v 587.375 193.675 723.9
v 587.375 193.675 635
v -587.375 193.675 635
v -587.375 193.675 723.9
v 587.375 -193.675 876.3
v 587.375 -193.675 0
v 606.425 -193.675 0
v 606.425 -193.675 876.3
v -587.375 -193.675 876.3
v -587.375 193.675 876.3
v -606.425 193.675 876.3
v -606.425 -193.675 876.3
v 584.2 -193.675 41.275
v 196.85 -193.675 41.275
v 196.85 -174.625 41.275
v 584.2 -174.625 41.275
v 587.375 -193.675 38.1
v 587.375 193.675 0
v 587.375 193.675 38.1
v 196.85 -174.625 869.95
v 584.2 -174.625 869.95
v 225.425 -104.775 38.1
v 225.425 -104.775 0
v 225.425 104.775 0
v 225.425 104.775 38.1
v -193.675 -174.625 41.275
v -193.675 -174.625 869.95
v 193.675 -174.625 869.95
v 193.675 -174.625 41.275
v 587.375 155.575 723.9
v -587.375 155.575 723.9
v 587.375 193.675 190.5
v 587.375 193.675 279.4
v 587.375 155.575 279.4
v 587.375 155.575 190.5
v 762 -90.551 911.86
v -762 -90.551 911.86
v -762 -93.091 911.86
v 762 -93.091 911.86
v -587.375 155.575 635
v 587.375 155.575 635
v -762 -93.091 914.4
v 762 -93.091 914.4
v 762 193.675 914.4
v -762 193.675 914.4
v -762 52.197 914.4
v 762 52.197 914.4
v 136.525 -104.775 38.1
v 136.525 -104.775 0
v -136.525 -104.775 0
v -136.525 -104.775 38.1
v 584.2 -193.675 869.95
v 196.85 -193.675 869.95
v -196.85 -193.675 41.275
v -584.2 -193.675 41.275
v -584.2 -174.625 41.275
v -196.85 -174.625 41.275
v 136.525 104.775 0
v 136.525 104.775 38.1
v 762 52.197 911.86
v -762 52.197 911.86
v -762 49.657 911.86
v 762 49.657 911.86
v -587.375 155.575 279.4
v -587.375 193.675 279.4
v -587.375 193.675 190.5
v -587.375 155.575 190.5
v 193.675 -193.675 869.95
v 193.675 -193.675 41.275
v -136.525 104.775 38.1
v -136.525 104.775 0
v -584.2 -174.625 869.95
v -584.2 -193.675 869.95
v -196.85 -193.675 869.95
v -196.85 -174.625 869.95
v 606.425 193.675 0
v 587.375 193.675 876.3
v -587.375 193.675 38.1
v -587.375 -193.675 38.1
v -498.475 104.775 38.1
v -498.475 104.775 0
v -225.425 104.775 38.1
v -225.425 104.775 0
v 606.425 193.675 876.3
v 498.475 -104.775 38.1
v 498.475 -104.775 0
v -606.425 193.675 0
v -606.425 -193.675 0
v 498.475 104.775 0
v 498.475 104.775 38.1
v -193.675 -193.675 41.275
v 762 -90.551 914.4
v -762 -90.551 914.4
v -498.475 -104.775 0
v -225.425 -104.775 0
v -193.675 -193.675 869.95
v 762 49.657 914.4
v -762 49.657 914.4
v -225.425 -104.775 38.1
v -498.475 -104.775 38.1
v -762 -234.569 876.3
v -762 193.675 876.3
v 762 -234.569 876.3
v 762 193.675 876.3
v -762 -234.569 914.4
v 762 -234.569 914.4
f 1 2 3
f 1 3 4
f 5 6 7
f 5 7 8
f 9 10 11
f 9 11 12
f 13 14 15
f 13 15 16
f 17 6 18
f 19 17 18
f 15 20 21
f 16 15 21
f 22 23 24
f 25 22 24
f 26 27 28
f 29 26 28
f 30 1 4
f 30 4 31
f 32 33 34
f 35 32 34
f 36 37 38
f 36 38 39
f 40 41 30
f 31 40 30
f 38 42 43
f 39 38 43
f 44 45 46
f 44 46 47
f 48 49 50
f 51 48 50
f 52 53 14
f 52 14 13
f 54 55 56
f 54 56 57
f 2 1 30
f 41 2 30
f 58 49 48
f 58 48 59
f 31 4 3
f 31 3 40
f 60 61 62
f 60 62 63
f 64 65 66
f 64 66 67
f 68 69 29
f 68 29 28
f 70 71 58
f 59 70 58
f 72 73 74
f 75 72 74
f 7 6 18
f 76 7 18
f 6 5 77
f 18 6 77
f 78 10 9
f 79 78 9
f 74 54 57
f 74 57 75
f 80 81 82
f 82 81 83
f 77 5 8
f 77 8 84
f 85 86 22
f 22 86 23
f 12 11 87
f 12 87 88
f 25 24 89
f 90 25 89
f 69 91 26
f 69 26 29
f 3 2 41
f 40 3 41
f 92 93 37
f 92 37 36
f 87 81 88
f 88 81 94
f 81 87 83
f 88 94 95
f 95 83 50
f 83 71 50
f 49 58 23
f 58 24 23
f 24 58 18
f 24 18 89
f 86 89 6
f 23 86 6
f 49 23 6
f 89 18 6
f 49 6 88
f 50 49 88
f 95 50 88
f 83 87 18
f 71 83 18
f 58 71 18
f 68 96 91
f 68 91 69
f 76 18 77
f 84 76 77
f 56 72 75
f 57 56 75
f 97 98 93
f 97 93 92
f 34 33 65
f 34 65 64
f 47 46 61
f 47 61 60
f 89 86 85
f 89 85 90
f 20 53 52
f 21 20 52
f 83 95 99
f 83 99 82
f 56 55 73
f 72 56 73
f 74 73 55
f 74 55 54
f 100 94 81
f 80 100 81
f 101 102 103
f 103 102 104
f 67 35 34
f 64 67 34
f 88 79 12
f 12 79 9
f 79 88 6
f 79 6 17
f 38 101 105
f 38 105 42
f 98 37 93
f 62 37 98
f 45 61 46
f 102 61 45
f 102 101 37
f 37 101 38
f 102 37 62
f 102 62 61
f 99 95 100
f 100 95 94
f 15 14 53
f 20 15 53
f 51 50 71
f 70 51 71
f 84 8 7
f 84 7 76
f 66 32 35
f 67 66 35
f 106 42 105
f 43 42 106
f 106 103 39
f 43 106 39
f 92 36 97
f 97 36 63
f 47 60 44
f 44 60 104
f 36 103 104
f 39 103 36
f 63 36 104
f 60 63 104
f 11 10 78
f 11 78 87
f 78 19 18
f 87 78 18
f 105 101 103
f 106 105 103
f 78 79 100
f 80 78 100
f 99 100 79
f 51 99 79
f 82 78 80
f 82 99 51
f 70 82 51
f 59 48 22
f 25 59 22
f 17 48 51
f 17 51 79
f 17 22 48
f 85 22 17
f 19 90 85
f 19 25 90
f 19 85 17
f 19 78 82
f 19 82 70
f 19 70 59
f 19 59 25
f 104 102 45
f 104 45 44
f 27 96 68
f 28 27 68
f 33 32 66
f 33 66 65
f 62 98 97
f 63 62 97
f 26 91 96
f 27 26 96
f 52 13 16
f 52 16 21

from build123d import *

# Parameters (mm, degrees)
F0_W      = 88.9
F0_H      = 209.55
F1_DEPTH  = 38.1
F2_W      = 387.35
F2_H      = 838.2
F2_H_2    = 38.1
F3_DEPTH  = 19.05
F4_W      = 387.35
F4_H      = 876.3
F5_DEPTH  = 19.05
F6_W      = 1524
F6_H      = 428.244
F7_DEPTH  = 38.1
F8_W      = 387.35
F8_H      = 828.675
F9_DEPTH  = 19.05
F10_W     = 1524
F10_H     = 2.54
F11_DEPTH = 2.54
F12_W     = 38.1
F12_H     = 88.9
F13_DEPTH = 1174.75


with BuildPart() as f1:
    # F0 (on Top) → F1 (new body)
    with BuildSketch(Plane.XY):
        with Locations((542.925, 0)):
            Rectangle(F0_W, F0_H)
        Polygon((587.375, 193.675), (-587.375, 193.675), (-587.375, 104.775), (-498.475, 104.775), (-225.425, 104.775), (-136.525, 104.775), (136.525, 104.775), (225.425, 104.775), (498.475, 104.775), (587.375, 104.775), align=None)
        with Locations((-542.925, 0)):
            Rectangle(F0_W, F0_H)
        Polygon((-498.475, -104.775), (-587.375, -104.775), (-587.375, -193.675), (587.375, -193.675), (587.375, -104.775), (498.475, -104.775), (225.425, -104.775), (136.525, -104.775), (-136.525, -104.775), (-225.425, -104.775), align=None)
        with Locations((180.975, 0)):
            Rectangle(F0_W, F0_H)
        with Locations((-180.975, 0)):
            Rectangle(F0_W, F0_H)
    extrude(amount=F1_DEPTH)

    # F2 (on face) → F3 (join)
    with BuildSketch(Plane(origin=(-587.375, 0, 0), x_dir=(0, -1, 0), z_dir=(-1, 0, 0))):
        with Locations((0, 457.2)):
            Rectangle(F2_W, F2_H)
        with Locations((0, 19.05)):
            Rectangle(F2_W, F2_H_2)
    extrude(amount=F3_DEPTH)


with BuildPart() as f5:
    # F4 (on face) → F5 (new body)
    with BuildSketch(Plane.YZ.offset(587.375)):
        with Locations((0, 438.15)):
            Rectangle(F4_W, F4_H)
    extrude(amount=F5_DEPTH)


with BuildPart() as f7:
    # F6 (on face) → F7 (new body)
    with BuildSketch(Plane.XY.offset(876.3)):
        with Locations((0, -20.447)):
            Rectangle(F6_W, F6_H)
    extrude(amount=F7_DEPTH)

    # F10 (on face) → F11 (cut)
    with BuildSketch(Plane.XY.offset(914.4)):
        with Locations((0, 50.927)):
            Rectangle(F10_W, F10_H)
        with Locations((0, -91.821)):
            Rectangle(F10_W, F10_H)
    extrude(amount=-F11_DEPTH, mode=Mode.SUBTRACT)


with BuildPart() as f9:
    # F8 (on face) → F9 (new body)
    with BuildSketch(Plane.XZ.offset(193.675)):
        with Locations((-390.525, 455.6125)):
            Rectangle(F8_W, F8_H)
    extrude(amount=-F9_DEPTH)


with BuildPart() as f9b:
    # F8 (on face) → F9, piece 2 (new body)
    with BuildSketch(Plane.XZ.offset(193.675)):
        with Locations((390.525, 455.6125)):
            Rectangle(F8_W, F8_H)
    extrude(amount=-F9_DEPTH)


with BuildPart() as f9c:
    # F8 (on face) → F9, piece 3 (new body)
    with BuildSketch(Plane.XZ.offset(193.675)):
        with Locations((0, 455.6125)):
            Rectangle(F8_W, F8_H)
    extrude(amount=-F9_DEPTH)


with BuildPart() as f13:
    # F12 (on face) → F13 (new body, through all)
    with BuildSketch(Plane(origin=(587.375, 0, 0), x_dir=(0, -1, 0), z_dir=(-1, 0, 0))):
        with Locations((-174.625, 234.95)):
            Rectangle(F12_W, F12_H)
    extrude(amount=F13_DEPTH)


with BuildPart() as f13b:
    # F12 (on face) → F13, piece 2 (new body, through all)
    with BuildSketch(Plane(origin=(587.375, 0, 0), x_dir=(0, -1, 0), z_dir=(-1, 0, 0))):
        with Locations((-174.625, 679.45)):
            Rectangle(F12_W, F12_H)
    extrude(amount=F13_DEPTH)


solid = Compound([f1.part, f5.part, f7.part, f9.part, f9b.part, f9c.part, f13.part, f13b.part])
